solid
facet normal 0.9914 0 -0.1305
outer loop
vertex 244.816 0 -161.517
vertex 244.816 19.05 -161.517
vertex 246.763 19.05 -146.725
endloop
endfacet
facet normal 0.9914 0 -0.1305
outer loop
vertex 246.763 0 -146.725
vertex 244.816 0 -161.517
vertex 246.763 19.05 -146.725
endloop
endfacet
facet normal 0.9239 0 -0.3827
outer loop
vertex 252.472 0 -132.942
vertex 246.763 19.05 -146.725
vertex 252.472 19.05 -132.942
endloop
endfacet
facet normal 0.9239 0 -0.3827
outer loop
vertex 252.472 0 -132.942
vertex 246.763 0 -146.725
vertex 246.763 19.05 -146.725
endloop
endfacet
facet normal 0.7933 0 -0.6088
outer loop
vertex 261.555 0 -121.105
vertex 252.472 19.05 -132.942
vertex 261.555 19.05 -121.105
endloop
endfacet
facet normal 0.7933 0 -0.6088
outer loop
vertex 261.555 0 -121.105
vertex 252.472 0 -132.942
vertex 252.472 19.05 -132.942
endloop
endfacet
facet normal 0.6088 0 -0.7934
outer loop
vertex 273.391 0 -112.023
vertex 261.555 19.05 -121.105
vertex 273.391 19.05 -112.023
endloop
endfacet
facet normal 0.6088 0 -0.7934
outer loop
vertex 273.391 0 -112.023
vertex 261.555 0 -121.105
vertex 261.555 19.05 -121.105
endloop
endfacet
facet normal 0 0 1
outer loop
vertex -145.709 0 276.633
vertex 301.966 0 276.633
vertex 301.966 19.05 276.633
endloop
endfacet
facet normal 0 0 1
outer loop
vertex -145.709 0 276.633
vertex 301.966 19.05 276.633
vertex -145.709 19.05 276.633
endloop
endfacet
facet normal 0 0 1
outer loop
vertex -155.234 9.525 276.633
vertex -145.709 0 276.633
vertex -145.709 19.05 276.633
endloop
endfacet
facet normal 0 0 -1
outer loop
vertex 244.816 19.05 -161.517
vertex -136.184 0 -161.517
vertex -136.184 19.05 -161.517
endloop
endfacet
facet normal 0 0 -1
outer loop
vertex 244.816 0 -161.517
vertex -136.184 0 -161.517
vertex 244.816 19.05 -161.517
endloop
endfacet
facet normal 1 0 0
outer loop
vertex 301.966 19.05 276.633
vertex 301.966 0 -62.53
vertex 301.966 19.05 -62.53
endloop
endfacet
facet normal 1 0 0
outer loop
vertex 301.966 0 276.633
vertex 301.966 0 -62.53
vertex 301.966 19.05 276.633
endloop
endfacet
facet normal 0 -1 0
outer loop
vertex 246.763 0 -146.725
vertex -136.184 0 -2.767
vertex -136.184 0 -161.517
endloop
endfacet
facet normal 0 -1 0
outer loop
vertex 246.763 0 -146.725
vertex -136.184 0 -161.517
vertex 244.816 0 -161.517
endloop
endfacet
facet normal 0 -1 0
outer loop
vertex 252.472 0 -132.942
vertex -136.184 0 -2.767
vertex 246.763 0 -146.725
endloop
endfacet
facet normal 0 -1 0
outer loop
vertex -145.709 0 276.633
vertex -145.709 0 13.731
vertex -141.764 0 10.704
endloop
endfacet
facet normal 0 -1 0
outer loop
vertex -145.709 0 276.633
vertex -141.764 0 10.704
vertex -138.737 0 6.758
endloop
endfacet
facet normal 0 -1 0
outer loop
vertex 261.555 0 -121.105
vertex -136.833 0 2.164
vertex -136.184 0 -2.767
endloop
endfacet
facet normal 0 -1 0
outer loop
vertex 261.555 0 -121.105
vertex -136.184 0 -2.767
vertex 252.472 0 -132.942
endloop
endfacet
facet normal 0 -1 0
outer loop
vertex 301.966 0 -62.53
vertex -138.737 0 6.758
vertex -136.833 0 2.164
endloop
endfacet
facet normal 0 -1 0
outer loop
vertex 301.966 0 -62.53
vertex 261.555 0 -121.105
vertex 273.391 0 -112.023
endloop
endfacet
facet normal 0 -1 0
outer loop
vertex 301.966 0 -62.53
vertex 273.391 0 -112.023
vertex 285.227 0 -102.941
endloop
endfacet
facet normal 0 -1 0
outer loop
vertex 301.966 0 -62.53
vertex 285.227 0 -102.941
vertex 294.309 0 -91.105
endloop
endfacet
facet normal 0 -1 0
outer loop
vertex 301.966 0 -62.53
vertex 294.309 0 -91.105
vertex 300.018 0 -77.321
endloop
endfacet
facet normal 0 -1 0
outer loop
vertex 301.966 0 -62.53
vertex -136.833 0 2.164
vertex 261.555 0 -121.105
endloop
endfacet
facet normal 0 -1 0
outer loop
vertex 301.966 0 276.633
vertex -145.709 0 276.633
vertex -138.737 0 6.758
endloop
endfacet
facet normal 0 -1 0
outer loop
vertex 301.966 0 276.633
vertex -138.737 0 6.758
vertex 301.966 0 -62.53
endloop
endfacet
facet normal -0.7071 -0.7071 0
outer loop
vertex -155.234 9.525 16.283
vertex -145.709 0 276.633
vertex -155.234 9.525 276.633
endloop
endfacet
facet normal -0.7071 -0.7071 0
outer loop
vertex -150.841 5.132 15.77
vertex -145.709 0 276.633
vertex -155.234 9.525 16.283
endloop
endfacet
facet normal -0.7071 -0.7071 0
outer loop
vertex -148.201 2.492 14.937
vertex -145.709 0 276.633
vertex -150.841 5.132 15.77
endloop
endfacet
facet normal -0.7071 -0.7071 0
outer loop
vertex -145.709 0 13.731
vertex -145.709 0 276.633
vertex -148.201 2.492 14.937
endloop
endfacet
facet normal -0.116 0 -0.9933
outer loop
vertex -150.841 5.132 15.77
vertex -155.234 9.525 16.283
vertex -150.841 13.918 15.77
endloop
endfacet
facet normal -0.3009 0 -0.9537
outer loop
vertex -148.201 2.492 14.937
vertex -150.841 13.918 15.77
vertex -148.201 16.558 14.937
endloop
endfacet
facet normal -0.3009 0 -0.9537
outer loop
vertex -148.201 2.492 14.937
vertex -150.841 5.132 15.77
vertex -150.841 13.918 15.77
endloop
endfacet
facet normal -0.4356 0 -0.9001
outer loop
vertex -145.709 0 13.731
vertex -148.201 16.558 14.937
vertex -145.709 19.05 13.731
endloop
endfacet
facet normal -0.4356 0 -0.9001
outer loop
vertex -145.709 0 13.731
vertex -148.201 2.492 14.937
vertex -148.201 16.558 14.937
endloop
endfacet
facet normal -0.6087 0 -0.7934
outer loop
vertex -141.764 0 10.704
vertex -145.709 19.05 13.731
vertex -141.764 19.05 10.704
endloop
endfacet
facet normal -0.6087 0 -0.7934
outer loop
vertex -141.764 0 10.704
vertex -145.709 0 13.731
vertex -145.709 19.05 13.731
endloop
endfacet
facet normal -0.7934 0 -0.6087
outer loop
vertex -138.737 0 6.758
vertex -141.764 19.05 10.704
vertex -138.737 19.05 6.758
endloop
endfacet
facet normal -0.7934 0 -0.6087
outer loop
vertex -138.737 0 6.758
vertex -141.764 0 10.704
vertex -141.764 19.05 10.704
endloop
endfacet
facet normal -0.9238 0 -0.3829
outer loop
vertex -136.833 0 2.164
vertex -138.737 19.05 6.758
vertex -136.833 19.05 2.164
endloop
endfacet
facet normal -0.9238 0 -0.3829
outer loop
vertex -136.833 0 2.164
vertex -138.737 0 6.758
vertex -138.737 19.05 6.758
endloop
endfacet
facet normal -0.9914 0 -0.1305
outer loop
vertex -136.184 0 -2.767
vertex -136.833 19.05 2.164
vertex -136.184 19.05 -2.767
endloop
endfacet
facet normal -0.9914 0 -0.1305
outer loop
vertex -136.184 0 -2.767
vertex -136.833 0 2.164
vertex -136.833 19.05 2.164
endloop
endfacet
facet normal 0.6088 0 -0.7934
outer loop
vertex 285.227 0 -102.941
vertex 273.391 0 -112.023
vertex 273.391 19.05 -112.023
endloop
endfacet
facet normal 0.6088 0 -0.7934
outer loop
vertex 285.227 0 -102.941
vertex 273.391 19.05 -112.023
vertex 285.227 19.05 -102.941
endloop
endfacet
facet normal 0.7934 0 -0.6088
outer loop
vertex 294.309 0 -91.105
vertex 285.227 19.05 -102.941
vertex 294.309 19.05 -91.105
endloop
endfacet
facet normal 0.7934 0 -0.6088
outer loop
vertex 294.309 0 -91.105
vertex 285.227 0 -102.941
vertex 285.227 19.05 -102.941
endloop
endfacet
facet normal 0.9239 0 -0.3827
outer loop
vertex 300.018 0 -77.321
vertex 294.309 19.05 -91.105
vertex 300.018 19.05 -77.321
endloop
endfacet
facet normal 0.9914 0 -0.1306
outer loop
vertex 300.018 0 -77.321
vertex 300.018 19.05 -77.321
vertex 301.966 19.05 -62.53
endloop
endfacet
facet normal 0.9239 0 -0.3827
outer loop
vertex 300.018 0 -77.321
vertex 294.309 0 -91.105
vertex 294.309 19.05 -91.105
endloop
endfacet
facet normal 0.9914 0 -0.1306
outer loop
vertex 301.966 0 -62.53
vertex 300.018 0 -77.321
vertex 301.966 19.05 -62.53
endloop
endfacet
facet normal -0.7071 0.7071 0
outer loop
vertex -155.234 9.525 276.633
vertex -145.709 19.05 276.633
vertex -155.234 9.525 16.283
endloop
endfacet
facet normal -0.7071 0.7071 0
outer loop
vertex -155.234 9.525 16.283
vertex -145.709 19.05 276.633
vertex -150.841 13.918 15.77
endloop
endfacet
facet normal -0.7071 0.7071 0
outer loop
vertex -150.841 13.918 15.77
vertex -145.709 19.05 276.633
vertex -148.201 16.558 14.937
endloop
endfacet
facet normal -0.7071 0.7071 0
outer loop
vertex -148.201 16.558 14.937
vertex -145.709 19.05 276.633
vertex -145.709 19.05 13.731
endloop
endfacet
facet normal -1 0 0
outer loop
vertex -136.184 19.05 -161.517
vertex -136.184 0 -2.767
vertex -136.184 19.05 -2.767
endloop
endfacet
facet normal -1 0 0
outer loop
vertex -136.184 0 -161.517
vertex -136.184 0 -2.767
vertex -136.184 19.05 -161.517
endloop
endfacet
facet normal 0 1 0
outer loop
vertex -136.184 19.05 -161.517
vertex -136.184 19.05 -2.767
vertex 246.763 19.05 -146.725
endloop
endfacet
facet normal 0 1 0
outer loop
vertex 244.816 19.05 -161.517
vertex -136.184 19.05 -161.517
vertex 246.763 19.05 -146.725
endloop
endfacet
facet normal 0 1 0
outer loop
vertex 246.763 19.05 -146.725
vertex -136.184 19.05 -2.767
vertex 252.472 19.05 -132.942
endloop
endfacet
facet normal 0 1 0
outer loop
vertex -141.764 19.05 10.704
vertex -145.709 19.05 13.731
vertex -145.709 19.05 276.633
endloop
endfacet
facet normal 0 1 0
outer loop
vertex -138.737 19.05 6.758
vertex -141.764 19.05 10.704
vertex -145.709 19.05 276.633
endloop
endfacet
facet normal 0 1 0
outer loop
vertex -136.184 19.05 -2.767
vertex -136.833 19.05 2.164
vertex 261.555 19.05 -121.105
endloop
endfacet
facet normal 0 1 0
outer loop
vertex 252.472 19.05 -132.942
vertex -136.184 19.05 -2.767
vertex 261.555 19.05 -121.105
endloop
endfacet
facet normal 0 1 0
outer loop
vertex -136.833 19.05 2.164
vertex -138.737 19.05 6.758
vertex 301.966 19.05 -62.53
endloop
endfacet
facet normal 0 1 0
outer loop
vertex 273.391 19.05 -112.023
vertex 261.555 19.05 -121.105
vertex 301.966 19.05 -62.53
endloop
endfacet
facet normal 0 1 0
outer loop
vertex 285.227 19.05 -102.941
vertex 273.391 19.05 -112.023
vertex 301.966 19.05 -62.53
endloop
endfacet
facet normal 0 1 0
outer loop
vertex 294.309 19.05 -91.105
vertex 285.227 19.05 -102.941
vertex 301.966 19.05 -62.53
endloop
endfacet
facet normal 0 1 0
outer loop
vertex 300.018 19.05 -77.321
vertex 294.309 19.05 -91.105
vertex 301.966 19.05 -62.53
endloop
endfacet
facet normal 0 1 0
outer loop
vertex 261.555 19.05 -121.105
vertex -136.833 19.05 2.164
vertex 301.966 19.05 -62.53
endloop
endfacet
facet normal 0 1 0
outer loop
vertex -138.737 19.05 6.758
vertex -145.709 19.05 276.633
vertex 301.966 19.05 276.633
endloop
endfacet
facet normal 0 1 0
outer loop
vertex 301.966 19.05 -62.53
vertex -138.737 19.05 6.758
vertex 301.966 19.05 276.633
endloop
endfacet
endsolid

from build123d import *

# Parameters (mm, degrees)
F1_DEPTH = 19.05
F2_SIZE  = 9.52499


# Not quite as in the source:
# - a fillet or chamfer is up to 0.001 mm smaller than in the source, because OpenCascade refuses the exact size


with BuildPart() as f1:
    # F0 (on Front) → F1 (new body)
    with BuildSketch(Plane.XZ):
        with BuildLine():
            Line((301.9656721215, 276.6333943507), (-155.2343278785, 276.6333943507))
            Line((-155.2343278785, 276.6333943507), (-155.2343278785, 16.2833943507))
            ThreePointArc((-155.2343278785, 16.2833943507), (-141.7639436969, 10.7037785323), (-136.1843278785, -2.7666056493))
            Line((-136.1843278785, -2.7666056493), (-136.1843278785, -161.5166056493))
            Line((-136.1843278785, -161.5166056493), (244.8156721215, -161.5166056493))
            ThreePointArc((244.8156721215, -161.5166056493), (252.4723202952, -132.9416056493), (273.3906721215, -112.023253823))
            ThreePointArc((273.3906721215, -112.023253823), (294.3090239478, -91.1049019968), (301.9656721215, -62.5299019968))
            Line((301.9656721215, -62.5299019968), (301.9656721215, 276.6333943507))
        make_face()
    extrude(amount=-F1_DEPTH)

    # F2 (size 9.525 in the source; OpenCascade refuses exactly that, so slightly less here)
    f2_edges = [f1.edges().sort_by_distance(p)[0] for p in [
        (-155.234328, 0, 146.458394),
        (-155.234328, 19.05, 146.458394),
    ]]
    chamfer(f2_edges, length=F2_SIZE)


solid = f1.part
